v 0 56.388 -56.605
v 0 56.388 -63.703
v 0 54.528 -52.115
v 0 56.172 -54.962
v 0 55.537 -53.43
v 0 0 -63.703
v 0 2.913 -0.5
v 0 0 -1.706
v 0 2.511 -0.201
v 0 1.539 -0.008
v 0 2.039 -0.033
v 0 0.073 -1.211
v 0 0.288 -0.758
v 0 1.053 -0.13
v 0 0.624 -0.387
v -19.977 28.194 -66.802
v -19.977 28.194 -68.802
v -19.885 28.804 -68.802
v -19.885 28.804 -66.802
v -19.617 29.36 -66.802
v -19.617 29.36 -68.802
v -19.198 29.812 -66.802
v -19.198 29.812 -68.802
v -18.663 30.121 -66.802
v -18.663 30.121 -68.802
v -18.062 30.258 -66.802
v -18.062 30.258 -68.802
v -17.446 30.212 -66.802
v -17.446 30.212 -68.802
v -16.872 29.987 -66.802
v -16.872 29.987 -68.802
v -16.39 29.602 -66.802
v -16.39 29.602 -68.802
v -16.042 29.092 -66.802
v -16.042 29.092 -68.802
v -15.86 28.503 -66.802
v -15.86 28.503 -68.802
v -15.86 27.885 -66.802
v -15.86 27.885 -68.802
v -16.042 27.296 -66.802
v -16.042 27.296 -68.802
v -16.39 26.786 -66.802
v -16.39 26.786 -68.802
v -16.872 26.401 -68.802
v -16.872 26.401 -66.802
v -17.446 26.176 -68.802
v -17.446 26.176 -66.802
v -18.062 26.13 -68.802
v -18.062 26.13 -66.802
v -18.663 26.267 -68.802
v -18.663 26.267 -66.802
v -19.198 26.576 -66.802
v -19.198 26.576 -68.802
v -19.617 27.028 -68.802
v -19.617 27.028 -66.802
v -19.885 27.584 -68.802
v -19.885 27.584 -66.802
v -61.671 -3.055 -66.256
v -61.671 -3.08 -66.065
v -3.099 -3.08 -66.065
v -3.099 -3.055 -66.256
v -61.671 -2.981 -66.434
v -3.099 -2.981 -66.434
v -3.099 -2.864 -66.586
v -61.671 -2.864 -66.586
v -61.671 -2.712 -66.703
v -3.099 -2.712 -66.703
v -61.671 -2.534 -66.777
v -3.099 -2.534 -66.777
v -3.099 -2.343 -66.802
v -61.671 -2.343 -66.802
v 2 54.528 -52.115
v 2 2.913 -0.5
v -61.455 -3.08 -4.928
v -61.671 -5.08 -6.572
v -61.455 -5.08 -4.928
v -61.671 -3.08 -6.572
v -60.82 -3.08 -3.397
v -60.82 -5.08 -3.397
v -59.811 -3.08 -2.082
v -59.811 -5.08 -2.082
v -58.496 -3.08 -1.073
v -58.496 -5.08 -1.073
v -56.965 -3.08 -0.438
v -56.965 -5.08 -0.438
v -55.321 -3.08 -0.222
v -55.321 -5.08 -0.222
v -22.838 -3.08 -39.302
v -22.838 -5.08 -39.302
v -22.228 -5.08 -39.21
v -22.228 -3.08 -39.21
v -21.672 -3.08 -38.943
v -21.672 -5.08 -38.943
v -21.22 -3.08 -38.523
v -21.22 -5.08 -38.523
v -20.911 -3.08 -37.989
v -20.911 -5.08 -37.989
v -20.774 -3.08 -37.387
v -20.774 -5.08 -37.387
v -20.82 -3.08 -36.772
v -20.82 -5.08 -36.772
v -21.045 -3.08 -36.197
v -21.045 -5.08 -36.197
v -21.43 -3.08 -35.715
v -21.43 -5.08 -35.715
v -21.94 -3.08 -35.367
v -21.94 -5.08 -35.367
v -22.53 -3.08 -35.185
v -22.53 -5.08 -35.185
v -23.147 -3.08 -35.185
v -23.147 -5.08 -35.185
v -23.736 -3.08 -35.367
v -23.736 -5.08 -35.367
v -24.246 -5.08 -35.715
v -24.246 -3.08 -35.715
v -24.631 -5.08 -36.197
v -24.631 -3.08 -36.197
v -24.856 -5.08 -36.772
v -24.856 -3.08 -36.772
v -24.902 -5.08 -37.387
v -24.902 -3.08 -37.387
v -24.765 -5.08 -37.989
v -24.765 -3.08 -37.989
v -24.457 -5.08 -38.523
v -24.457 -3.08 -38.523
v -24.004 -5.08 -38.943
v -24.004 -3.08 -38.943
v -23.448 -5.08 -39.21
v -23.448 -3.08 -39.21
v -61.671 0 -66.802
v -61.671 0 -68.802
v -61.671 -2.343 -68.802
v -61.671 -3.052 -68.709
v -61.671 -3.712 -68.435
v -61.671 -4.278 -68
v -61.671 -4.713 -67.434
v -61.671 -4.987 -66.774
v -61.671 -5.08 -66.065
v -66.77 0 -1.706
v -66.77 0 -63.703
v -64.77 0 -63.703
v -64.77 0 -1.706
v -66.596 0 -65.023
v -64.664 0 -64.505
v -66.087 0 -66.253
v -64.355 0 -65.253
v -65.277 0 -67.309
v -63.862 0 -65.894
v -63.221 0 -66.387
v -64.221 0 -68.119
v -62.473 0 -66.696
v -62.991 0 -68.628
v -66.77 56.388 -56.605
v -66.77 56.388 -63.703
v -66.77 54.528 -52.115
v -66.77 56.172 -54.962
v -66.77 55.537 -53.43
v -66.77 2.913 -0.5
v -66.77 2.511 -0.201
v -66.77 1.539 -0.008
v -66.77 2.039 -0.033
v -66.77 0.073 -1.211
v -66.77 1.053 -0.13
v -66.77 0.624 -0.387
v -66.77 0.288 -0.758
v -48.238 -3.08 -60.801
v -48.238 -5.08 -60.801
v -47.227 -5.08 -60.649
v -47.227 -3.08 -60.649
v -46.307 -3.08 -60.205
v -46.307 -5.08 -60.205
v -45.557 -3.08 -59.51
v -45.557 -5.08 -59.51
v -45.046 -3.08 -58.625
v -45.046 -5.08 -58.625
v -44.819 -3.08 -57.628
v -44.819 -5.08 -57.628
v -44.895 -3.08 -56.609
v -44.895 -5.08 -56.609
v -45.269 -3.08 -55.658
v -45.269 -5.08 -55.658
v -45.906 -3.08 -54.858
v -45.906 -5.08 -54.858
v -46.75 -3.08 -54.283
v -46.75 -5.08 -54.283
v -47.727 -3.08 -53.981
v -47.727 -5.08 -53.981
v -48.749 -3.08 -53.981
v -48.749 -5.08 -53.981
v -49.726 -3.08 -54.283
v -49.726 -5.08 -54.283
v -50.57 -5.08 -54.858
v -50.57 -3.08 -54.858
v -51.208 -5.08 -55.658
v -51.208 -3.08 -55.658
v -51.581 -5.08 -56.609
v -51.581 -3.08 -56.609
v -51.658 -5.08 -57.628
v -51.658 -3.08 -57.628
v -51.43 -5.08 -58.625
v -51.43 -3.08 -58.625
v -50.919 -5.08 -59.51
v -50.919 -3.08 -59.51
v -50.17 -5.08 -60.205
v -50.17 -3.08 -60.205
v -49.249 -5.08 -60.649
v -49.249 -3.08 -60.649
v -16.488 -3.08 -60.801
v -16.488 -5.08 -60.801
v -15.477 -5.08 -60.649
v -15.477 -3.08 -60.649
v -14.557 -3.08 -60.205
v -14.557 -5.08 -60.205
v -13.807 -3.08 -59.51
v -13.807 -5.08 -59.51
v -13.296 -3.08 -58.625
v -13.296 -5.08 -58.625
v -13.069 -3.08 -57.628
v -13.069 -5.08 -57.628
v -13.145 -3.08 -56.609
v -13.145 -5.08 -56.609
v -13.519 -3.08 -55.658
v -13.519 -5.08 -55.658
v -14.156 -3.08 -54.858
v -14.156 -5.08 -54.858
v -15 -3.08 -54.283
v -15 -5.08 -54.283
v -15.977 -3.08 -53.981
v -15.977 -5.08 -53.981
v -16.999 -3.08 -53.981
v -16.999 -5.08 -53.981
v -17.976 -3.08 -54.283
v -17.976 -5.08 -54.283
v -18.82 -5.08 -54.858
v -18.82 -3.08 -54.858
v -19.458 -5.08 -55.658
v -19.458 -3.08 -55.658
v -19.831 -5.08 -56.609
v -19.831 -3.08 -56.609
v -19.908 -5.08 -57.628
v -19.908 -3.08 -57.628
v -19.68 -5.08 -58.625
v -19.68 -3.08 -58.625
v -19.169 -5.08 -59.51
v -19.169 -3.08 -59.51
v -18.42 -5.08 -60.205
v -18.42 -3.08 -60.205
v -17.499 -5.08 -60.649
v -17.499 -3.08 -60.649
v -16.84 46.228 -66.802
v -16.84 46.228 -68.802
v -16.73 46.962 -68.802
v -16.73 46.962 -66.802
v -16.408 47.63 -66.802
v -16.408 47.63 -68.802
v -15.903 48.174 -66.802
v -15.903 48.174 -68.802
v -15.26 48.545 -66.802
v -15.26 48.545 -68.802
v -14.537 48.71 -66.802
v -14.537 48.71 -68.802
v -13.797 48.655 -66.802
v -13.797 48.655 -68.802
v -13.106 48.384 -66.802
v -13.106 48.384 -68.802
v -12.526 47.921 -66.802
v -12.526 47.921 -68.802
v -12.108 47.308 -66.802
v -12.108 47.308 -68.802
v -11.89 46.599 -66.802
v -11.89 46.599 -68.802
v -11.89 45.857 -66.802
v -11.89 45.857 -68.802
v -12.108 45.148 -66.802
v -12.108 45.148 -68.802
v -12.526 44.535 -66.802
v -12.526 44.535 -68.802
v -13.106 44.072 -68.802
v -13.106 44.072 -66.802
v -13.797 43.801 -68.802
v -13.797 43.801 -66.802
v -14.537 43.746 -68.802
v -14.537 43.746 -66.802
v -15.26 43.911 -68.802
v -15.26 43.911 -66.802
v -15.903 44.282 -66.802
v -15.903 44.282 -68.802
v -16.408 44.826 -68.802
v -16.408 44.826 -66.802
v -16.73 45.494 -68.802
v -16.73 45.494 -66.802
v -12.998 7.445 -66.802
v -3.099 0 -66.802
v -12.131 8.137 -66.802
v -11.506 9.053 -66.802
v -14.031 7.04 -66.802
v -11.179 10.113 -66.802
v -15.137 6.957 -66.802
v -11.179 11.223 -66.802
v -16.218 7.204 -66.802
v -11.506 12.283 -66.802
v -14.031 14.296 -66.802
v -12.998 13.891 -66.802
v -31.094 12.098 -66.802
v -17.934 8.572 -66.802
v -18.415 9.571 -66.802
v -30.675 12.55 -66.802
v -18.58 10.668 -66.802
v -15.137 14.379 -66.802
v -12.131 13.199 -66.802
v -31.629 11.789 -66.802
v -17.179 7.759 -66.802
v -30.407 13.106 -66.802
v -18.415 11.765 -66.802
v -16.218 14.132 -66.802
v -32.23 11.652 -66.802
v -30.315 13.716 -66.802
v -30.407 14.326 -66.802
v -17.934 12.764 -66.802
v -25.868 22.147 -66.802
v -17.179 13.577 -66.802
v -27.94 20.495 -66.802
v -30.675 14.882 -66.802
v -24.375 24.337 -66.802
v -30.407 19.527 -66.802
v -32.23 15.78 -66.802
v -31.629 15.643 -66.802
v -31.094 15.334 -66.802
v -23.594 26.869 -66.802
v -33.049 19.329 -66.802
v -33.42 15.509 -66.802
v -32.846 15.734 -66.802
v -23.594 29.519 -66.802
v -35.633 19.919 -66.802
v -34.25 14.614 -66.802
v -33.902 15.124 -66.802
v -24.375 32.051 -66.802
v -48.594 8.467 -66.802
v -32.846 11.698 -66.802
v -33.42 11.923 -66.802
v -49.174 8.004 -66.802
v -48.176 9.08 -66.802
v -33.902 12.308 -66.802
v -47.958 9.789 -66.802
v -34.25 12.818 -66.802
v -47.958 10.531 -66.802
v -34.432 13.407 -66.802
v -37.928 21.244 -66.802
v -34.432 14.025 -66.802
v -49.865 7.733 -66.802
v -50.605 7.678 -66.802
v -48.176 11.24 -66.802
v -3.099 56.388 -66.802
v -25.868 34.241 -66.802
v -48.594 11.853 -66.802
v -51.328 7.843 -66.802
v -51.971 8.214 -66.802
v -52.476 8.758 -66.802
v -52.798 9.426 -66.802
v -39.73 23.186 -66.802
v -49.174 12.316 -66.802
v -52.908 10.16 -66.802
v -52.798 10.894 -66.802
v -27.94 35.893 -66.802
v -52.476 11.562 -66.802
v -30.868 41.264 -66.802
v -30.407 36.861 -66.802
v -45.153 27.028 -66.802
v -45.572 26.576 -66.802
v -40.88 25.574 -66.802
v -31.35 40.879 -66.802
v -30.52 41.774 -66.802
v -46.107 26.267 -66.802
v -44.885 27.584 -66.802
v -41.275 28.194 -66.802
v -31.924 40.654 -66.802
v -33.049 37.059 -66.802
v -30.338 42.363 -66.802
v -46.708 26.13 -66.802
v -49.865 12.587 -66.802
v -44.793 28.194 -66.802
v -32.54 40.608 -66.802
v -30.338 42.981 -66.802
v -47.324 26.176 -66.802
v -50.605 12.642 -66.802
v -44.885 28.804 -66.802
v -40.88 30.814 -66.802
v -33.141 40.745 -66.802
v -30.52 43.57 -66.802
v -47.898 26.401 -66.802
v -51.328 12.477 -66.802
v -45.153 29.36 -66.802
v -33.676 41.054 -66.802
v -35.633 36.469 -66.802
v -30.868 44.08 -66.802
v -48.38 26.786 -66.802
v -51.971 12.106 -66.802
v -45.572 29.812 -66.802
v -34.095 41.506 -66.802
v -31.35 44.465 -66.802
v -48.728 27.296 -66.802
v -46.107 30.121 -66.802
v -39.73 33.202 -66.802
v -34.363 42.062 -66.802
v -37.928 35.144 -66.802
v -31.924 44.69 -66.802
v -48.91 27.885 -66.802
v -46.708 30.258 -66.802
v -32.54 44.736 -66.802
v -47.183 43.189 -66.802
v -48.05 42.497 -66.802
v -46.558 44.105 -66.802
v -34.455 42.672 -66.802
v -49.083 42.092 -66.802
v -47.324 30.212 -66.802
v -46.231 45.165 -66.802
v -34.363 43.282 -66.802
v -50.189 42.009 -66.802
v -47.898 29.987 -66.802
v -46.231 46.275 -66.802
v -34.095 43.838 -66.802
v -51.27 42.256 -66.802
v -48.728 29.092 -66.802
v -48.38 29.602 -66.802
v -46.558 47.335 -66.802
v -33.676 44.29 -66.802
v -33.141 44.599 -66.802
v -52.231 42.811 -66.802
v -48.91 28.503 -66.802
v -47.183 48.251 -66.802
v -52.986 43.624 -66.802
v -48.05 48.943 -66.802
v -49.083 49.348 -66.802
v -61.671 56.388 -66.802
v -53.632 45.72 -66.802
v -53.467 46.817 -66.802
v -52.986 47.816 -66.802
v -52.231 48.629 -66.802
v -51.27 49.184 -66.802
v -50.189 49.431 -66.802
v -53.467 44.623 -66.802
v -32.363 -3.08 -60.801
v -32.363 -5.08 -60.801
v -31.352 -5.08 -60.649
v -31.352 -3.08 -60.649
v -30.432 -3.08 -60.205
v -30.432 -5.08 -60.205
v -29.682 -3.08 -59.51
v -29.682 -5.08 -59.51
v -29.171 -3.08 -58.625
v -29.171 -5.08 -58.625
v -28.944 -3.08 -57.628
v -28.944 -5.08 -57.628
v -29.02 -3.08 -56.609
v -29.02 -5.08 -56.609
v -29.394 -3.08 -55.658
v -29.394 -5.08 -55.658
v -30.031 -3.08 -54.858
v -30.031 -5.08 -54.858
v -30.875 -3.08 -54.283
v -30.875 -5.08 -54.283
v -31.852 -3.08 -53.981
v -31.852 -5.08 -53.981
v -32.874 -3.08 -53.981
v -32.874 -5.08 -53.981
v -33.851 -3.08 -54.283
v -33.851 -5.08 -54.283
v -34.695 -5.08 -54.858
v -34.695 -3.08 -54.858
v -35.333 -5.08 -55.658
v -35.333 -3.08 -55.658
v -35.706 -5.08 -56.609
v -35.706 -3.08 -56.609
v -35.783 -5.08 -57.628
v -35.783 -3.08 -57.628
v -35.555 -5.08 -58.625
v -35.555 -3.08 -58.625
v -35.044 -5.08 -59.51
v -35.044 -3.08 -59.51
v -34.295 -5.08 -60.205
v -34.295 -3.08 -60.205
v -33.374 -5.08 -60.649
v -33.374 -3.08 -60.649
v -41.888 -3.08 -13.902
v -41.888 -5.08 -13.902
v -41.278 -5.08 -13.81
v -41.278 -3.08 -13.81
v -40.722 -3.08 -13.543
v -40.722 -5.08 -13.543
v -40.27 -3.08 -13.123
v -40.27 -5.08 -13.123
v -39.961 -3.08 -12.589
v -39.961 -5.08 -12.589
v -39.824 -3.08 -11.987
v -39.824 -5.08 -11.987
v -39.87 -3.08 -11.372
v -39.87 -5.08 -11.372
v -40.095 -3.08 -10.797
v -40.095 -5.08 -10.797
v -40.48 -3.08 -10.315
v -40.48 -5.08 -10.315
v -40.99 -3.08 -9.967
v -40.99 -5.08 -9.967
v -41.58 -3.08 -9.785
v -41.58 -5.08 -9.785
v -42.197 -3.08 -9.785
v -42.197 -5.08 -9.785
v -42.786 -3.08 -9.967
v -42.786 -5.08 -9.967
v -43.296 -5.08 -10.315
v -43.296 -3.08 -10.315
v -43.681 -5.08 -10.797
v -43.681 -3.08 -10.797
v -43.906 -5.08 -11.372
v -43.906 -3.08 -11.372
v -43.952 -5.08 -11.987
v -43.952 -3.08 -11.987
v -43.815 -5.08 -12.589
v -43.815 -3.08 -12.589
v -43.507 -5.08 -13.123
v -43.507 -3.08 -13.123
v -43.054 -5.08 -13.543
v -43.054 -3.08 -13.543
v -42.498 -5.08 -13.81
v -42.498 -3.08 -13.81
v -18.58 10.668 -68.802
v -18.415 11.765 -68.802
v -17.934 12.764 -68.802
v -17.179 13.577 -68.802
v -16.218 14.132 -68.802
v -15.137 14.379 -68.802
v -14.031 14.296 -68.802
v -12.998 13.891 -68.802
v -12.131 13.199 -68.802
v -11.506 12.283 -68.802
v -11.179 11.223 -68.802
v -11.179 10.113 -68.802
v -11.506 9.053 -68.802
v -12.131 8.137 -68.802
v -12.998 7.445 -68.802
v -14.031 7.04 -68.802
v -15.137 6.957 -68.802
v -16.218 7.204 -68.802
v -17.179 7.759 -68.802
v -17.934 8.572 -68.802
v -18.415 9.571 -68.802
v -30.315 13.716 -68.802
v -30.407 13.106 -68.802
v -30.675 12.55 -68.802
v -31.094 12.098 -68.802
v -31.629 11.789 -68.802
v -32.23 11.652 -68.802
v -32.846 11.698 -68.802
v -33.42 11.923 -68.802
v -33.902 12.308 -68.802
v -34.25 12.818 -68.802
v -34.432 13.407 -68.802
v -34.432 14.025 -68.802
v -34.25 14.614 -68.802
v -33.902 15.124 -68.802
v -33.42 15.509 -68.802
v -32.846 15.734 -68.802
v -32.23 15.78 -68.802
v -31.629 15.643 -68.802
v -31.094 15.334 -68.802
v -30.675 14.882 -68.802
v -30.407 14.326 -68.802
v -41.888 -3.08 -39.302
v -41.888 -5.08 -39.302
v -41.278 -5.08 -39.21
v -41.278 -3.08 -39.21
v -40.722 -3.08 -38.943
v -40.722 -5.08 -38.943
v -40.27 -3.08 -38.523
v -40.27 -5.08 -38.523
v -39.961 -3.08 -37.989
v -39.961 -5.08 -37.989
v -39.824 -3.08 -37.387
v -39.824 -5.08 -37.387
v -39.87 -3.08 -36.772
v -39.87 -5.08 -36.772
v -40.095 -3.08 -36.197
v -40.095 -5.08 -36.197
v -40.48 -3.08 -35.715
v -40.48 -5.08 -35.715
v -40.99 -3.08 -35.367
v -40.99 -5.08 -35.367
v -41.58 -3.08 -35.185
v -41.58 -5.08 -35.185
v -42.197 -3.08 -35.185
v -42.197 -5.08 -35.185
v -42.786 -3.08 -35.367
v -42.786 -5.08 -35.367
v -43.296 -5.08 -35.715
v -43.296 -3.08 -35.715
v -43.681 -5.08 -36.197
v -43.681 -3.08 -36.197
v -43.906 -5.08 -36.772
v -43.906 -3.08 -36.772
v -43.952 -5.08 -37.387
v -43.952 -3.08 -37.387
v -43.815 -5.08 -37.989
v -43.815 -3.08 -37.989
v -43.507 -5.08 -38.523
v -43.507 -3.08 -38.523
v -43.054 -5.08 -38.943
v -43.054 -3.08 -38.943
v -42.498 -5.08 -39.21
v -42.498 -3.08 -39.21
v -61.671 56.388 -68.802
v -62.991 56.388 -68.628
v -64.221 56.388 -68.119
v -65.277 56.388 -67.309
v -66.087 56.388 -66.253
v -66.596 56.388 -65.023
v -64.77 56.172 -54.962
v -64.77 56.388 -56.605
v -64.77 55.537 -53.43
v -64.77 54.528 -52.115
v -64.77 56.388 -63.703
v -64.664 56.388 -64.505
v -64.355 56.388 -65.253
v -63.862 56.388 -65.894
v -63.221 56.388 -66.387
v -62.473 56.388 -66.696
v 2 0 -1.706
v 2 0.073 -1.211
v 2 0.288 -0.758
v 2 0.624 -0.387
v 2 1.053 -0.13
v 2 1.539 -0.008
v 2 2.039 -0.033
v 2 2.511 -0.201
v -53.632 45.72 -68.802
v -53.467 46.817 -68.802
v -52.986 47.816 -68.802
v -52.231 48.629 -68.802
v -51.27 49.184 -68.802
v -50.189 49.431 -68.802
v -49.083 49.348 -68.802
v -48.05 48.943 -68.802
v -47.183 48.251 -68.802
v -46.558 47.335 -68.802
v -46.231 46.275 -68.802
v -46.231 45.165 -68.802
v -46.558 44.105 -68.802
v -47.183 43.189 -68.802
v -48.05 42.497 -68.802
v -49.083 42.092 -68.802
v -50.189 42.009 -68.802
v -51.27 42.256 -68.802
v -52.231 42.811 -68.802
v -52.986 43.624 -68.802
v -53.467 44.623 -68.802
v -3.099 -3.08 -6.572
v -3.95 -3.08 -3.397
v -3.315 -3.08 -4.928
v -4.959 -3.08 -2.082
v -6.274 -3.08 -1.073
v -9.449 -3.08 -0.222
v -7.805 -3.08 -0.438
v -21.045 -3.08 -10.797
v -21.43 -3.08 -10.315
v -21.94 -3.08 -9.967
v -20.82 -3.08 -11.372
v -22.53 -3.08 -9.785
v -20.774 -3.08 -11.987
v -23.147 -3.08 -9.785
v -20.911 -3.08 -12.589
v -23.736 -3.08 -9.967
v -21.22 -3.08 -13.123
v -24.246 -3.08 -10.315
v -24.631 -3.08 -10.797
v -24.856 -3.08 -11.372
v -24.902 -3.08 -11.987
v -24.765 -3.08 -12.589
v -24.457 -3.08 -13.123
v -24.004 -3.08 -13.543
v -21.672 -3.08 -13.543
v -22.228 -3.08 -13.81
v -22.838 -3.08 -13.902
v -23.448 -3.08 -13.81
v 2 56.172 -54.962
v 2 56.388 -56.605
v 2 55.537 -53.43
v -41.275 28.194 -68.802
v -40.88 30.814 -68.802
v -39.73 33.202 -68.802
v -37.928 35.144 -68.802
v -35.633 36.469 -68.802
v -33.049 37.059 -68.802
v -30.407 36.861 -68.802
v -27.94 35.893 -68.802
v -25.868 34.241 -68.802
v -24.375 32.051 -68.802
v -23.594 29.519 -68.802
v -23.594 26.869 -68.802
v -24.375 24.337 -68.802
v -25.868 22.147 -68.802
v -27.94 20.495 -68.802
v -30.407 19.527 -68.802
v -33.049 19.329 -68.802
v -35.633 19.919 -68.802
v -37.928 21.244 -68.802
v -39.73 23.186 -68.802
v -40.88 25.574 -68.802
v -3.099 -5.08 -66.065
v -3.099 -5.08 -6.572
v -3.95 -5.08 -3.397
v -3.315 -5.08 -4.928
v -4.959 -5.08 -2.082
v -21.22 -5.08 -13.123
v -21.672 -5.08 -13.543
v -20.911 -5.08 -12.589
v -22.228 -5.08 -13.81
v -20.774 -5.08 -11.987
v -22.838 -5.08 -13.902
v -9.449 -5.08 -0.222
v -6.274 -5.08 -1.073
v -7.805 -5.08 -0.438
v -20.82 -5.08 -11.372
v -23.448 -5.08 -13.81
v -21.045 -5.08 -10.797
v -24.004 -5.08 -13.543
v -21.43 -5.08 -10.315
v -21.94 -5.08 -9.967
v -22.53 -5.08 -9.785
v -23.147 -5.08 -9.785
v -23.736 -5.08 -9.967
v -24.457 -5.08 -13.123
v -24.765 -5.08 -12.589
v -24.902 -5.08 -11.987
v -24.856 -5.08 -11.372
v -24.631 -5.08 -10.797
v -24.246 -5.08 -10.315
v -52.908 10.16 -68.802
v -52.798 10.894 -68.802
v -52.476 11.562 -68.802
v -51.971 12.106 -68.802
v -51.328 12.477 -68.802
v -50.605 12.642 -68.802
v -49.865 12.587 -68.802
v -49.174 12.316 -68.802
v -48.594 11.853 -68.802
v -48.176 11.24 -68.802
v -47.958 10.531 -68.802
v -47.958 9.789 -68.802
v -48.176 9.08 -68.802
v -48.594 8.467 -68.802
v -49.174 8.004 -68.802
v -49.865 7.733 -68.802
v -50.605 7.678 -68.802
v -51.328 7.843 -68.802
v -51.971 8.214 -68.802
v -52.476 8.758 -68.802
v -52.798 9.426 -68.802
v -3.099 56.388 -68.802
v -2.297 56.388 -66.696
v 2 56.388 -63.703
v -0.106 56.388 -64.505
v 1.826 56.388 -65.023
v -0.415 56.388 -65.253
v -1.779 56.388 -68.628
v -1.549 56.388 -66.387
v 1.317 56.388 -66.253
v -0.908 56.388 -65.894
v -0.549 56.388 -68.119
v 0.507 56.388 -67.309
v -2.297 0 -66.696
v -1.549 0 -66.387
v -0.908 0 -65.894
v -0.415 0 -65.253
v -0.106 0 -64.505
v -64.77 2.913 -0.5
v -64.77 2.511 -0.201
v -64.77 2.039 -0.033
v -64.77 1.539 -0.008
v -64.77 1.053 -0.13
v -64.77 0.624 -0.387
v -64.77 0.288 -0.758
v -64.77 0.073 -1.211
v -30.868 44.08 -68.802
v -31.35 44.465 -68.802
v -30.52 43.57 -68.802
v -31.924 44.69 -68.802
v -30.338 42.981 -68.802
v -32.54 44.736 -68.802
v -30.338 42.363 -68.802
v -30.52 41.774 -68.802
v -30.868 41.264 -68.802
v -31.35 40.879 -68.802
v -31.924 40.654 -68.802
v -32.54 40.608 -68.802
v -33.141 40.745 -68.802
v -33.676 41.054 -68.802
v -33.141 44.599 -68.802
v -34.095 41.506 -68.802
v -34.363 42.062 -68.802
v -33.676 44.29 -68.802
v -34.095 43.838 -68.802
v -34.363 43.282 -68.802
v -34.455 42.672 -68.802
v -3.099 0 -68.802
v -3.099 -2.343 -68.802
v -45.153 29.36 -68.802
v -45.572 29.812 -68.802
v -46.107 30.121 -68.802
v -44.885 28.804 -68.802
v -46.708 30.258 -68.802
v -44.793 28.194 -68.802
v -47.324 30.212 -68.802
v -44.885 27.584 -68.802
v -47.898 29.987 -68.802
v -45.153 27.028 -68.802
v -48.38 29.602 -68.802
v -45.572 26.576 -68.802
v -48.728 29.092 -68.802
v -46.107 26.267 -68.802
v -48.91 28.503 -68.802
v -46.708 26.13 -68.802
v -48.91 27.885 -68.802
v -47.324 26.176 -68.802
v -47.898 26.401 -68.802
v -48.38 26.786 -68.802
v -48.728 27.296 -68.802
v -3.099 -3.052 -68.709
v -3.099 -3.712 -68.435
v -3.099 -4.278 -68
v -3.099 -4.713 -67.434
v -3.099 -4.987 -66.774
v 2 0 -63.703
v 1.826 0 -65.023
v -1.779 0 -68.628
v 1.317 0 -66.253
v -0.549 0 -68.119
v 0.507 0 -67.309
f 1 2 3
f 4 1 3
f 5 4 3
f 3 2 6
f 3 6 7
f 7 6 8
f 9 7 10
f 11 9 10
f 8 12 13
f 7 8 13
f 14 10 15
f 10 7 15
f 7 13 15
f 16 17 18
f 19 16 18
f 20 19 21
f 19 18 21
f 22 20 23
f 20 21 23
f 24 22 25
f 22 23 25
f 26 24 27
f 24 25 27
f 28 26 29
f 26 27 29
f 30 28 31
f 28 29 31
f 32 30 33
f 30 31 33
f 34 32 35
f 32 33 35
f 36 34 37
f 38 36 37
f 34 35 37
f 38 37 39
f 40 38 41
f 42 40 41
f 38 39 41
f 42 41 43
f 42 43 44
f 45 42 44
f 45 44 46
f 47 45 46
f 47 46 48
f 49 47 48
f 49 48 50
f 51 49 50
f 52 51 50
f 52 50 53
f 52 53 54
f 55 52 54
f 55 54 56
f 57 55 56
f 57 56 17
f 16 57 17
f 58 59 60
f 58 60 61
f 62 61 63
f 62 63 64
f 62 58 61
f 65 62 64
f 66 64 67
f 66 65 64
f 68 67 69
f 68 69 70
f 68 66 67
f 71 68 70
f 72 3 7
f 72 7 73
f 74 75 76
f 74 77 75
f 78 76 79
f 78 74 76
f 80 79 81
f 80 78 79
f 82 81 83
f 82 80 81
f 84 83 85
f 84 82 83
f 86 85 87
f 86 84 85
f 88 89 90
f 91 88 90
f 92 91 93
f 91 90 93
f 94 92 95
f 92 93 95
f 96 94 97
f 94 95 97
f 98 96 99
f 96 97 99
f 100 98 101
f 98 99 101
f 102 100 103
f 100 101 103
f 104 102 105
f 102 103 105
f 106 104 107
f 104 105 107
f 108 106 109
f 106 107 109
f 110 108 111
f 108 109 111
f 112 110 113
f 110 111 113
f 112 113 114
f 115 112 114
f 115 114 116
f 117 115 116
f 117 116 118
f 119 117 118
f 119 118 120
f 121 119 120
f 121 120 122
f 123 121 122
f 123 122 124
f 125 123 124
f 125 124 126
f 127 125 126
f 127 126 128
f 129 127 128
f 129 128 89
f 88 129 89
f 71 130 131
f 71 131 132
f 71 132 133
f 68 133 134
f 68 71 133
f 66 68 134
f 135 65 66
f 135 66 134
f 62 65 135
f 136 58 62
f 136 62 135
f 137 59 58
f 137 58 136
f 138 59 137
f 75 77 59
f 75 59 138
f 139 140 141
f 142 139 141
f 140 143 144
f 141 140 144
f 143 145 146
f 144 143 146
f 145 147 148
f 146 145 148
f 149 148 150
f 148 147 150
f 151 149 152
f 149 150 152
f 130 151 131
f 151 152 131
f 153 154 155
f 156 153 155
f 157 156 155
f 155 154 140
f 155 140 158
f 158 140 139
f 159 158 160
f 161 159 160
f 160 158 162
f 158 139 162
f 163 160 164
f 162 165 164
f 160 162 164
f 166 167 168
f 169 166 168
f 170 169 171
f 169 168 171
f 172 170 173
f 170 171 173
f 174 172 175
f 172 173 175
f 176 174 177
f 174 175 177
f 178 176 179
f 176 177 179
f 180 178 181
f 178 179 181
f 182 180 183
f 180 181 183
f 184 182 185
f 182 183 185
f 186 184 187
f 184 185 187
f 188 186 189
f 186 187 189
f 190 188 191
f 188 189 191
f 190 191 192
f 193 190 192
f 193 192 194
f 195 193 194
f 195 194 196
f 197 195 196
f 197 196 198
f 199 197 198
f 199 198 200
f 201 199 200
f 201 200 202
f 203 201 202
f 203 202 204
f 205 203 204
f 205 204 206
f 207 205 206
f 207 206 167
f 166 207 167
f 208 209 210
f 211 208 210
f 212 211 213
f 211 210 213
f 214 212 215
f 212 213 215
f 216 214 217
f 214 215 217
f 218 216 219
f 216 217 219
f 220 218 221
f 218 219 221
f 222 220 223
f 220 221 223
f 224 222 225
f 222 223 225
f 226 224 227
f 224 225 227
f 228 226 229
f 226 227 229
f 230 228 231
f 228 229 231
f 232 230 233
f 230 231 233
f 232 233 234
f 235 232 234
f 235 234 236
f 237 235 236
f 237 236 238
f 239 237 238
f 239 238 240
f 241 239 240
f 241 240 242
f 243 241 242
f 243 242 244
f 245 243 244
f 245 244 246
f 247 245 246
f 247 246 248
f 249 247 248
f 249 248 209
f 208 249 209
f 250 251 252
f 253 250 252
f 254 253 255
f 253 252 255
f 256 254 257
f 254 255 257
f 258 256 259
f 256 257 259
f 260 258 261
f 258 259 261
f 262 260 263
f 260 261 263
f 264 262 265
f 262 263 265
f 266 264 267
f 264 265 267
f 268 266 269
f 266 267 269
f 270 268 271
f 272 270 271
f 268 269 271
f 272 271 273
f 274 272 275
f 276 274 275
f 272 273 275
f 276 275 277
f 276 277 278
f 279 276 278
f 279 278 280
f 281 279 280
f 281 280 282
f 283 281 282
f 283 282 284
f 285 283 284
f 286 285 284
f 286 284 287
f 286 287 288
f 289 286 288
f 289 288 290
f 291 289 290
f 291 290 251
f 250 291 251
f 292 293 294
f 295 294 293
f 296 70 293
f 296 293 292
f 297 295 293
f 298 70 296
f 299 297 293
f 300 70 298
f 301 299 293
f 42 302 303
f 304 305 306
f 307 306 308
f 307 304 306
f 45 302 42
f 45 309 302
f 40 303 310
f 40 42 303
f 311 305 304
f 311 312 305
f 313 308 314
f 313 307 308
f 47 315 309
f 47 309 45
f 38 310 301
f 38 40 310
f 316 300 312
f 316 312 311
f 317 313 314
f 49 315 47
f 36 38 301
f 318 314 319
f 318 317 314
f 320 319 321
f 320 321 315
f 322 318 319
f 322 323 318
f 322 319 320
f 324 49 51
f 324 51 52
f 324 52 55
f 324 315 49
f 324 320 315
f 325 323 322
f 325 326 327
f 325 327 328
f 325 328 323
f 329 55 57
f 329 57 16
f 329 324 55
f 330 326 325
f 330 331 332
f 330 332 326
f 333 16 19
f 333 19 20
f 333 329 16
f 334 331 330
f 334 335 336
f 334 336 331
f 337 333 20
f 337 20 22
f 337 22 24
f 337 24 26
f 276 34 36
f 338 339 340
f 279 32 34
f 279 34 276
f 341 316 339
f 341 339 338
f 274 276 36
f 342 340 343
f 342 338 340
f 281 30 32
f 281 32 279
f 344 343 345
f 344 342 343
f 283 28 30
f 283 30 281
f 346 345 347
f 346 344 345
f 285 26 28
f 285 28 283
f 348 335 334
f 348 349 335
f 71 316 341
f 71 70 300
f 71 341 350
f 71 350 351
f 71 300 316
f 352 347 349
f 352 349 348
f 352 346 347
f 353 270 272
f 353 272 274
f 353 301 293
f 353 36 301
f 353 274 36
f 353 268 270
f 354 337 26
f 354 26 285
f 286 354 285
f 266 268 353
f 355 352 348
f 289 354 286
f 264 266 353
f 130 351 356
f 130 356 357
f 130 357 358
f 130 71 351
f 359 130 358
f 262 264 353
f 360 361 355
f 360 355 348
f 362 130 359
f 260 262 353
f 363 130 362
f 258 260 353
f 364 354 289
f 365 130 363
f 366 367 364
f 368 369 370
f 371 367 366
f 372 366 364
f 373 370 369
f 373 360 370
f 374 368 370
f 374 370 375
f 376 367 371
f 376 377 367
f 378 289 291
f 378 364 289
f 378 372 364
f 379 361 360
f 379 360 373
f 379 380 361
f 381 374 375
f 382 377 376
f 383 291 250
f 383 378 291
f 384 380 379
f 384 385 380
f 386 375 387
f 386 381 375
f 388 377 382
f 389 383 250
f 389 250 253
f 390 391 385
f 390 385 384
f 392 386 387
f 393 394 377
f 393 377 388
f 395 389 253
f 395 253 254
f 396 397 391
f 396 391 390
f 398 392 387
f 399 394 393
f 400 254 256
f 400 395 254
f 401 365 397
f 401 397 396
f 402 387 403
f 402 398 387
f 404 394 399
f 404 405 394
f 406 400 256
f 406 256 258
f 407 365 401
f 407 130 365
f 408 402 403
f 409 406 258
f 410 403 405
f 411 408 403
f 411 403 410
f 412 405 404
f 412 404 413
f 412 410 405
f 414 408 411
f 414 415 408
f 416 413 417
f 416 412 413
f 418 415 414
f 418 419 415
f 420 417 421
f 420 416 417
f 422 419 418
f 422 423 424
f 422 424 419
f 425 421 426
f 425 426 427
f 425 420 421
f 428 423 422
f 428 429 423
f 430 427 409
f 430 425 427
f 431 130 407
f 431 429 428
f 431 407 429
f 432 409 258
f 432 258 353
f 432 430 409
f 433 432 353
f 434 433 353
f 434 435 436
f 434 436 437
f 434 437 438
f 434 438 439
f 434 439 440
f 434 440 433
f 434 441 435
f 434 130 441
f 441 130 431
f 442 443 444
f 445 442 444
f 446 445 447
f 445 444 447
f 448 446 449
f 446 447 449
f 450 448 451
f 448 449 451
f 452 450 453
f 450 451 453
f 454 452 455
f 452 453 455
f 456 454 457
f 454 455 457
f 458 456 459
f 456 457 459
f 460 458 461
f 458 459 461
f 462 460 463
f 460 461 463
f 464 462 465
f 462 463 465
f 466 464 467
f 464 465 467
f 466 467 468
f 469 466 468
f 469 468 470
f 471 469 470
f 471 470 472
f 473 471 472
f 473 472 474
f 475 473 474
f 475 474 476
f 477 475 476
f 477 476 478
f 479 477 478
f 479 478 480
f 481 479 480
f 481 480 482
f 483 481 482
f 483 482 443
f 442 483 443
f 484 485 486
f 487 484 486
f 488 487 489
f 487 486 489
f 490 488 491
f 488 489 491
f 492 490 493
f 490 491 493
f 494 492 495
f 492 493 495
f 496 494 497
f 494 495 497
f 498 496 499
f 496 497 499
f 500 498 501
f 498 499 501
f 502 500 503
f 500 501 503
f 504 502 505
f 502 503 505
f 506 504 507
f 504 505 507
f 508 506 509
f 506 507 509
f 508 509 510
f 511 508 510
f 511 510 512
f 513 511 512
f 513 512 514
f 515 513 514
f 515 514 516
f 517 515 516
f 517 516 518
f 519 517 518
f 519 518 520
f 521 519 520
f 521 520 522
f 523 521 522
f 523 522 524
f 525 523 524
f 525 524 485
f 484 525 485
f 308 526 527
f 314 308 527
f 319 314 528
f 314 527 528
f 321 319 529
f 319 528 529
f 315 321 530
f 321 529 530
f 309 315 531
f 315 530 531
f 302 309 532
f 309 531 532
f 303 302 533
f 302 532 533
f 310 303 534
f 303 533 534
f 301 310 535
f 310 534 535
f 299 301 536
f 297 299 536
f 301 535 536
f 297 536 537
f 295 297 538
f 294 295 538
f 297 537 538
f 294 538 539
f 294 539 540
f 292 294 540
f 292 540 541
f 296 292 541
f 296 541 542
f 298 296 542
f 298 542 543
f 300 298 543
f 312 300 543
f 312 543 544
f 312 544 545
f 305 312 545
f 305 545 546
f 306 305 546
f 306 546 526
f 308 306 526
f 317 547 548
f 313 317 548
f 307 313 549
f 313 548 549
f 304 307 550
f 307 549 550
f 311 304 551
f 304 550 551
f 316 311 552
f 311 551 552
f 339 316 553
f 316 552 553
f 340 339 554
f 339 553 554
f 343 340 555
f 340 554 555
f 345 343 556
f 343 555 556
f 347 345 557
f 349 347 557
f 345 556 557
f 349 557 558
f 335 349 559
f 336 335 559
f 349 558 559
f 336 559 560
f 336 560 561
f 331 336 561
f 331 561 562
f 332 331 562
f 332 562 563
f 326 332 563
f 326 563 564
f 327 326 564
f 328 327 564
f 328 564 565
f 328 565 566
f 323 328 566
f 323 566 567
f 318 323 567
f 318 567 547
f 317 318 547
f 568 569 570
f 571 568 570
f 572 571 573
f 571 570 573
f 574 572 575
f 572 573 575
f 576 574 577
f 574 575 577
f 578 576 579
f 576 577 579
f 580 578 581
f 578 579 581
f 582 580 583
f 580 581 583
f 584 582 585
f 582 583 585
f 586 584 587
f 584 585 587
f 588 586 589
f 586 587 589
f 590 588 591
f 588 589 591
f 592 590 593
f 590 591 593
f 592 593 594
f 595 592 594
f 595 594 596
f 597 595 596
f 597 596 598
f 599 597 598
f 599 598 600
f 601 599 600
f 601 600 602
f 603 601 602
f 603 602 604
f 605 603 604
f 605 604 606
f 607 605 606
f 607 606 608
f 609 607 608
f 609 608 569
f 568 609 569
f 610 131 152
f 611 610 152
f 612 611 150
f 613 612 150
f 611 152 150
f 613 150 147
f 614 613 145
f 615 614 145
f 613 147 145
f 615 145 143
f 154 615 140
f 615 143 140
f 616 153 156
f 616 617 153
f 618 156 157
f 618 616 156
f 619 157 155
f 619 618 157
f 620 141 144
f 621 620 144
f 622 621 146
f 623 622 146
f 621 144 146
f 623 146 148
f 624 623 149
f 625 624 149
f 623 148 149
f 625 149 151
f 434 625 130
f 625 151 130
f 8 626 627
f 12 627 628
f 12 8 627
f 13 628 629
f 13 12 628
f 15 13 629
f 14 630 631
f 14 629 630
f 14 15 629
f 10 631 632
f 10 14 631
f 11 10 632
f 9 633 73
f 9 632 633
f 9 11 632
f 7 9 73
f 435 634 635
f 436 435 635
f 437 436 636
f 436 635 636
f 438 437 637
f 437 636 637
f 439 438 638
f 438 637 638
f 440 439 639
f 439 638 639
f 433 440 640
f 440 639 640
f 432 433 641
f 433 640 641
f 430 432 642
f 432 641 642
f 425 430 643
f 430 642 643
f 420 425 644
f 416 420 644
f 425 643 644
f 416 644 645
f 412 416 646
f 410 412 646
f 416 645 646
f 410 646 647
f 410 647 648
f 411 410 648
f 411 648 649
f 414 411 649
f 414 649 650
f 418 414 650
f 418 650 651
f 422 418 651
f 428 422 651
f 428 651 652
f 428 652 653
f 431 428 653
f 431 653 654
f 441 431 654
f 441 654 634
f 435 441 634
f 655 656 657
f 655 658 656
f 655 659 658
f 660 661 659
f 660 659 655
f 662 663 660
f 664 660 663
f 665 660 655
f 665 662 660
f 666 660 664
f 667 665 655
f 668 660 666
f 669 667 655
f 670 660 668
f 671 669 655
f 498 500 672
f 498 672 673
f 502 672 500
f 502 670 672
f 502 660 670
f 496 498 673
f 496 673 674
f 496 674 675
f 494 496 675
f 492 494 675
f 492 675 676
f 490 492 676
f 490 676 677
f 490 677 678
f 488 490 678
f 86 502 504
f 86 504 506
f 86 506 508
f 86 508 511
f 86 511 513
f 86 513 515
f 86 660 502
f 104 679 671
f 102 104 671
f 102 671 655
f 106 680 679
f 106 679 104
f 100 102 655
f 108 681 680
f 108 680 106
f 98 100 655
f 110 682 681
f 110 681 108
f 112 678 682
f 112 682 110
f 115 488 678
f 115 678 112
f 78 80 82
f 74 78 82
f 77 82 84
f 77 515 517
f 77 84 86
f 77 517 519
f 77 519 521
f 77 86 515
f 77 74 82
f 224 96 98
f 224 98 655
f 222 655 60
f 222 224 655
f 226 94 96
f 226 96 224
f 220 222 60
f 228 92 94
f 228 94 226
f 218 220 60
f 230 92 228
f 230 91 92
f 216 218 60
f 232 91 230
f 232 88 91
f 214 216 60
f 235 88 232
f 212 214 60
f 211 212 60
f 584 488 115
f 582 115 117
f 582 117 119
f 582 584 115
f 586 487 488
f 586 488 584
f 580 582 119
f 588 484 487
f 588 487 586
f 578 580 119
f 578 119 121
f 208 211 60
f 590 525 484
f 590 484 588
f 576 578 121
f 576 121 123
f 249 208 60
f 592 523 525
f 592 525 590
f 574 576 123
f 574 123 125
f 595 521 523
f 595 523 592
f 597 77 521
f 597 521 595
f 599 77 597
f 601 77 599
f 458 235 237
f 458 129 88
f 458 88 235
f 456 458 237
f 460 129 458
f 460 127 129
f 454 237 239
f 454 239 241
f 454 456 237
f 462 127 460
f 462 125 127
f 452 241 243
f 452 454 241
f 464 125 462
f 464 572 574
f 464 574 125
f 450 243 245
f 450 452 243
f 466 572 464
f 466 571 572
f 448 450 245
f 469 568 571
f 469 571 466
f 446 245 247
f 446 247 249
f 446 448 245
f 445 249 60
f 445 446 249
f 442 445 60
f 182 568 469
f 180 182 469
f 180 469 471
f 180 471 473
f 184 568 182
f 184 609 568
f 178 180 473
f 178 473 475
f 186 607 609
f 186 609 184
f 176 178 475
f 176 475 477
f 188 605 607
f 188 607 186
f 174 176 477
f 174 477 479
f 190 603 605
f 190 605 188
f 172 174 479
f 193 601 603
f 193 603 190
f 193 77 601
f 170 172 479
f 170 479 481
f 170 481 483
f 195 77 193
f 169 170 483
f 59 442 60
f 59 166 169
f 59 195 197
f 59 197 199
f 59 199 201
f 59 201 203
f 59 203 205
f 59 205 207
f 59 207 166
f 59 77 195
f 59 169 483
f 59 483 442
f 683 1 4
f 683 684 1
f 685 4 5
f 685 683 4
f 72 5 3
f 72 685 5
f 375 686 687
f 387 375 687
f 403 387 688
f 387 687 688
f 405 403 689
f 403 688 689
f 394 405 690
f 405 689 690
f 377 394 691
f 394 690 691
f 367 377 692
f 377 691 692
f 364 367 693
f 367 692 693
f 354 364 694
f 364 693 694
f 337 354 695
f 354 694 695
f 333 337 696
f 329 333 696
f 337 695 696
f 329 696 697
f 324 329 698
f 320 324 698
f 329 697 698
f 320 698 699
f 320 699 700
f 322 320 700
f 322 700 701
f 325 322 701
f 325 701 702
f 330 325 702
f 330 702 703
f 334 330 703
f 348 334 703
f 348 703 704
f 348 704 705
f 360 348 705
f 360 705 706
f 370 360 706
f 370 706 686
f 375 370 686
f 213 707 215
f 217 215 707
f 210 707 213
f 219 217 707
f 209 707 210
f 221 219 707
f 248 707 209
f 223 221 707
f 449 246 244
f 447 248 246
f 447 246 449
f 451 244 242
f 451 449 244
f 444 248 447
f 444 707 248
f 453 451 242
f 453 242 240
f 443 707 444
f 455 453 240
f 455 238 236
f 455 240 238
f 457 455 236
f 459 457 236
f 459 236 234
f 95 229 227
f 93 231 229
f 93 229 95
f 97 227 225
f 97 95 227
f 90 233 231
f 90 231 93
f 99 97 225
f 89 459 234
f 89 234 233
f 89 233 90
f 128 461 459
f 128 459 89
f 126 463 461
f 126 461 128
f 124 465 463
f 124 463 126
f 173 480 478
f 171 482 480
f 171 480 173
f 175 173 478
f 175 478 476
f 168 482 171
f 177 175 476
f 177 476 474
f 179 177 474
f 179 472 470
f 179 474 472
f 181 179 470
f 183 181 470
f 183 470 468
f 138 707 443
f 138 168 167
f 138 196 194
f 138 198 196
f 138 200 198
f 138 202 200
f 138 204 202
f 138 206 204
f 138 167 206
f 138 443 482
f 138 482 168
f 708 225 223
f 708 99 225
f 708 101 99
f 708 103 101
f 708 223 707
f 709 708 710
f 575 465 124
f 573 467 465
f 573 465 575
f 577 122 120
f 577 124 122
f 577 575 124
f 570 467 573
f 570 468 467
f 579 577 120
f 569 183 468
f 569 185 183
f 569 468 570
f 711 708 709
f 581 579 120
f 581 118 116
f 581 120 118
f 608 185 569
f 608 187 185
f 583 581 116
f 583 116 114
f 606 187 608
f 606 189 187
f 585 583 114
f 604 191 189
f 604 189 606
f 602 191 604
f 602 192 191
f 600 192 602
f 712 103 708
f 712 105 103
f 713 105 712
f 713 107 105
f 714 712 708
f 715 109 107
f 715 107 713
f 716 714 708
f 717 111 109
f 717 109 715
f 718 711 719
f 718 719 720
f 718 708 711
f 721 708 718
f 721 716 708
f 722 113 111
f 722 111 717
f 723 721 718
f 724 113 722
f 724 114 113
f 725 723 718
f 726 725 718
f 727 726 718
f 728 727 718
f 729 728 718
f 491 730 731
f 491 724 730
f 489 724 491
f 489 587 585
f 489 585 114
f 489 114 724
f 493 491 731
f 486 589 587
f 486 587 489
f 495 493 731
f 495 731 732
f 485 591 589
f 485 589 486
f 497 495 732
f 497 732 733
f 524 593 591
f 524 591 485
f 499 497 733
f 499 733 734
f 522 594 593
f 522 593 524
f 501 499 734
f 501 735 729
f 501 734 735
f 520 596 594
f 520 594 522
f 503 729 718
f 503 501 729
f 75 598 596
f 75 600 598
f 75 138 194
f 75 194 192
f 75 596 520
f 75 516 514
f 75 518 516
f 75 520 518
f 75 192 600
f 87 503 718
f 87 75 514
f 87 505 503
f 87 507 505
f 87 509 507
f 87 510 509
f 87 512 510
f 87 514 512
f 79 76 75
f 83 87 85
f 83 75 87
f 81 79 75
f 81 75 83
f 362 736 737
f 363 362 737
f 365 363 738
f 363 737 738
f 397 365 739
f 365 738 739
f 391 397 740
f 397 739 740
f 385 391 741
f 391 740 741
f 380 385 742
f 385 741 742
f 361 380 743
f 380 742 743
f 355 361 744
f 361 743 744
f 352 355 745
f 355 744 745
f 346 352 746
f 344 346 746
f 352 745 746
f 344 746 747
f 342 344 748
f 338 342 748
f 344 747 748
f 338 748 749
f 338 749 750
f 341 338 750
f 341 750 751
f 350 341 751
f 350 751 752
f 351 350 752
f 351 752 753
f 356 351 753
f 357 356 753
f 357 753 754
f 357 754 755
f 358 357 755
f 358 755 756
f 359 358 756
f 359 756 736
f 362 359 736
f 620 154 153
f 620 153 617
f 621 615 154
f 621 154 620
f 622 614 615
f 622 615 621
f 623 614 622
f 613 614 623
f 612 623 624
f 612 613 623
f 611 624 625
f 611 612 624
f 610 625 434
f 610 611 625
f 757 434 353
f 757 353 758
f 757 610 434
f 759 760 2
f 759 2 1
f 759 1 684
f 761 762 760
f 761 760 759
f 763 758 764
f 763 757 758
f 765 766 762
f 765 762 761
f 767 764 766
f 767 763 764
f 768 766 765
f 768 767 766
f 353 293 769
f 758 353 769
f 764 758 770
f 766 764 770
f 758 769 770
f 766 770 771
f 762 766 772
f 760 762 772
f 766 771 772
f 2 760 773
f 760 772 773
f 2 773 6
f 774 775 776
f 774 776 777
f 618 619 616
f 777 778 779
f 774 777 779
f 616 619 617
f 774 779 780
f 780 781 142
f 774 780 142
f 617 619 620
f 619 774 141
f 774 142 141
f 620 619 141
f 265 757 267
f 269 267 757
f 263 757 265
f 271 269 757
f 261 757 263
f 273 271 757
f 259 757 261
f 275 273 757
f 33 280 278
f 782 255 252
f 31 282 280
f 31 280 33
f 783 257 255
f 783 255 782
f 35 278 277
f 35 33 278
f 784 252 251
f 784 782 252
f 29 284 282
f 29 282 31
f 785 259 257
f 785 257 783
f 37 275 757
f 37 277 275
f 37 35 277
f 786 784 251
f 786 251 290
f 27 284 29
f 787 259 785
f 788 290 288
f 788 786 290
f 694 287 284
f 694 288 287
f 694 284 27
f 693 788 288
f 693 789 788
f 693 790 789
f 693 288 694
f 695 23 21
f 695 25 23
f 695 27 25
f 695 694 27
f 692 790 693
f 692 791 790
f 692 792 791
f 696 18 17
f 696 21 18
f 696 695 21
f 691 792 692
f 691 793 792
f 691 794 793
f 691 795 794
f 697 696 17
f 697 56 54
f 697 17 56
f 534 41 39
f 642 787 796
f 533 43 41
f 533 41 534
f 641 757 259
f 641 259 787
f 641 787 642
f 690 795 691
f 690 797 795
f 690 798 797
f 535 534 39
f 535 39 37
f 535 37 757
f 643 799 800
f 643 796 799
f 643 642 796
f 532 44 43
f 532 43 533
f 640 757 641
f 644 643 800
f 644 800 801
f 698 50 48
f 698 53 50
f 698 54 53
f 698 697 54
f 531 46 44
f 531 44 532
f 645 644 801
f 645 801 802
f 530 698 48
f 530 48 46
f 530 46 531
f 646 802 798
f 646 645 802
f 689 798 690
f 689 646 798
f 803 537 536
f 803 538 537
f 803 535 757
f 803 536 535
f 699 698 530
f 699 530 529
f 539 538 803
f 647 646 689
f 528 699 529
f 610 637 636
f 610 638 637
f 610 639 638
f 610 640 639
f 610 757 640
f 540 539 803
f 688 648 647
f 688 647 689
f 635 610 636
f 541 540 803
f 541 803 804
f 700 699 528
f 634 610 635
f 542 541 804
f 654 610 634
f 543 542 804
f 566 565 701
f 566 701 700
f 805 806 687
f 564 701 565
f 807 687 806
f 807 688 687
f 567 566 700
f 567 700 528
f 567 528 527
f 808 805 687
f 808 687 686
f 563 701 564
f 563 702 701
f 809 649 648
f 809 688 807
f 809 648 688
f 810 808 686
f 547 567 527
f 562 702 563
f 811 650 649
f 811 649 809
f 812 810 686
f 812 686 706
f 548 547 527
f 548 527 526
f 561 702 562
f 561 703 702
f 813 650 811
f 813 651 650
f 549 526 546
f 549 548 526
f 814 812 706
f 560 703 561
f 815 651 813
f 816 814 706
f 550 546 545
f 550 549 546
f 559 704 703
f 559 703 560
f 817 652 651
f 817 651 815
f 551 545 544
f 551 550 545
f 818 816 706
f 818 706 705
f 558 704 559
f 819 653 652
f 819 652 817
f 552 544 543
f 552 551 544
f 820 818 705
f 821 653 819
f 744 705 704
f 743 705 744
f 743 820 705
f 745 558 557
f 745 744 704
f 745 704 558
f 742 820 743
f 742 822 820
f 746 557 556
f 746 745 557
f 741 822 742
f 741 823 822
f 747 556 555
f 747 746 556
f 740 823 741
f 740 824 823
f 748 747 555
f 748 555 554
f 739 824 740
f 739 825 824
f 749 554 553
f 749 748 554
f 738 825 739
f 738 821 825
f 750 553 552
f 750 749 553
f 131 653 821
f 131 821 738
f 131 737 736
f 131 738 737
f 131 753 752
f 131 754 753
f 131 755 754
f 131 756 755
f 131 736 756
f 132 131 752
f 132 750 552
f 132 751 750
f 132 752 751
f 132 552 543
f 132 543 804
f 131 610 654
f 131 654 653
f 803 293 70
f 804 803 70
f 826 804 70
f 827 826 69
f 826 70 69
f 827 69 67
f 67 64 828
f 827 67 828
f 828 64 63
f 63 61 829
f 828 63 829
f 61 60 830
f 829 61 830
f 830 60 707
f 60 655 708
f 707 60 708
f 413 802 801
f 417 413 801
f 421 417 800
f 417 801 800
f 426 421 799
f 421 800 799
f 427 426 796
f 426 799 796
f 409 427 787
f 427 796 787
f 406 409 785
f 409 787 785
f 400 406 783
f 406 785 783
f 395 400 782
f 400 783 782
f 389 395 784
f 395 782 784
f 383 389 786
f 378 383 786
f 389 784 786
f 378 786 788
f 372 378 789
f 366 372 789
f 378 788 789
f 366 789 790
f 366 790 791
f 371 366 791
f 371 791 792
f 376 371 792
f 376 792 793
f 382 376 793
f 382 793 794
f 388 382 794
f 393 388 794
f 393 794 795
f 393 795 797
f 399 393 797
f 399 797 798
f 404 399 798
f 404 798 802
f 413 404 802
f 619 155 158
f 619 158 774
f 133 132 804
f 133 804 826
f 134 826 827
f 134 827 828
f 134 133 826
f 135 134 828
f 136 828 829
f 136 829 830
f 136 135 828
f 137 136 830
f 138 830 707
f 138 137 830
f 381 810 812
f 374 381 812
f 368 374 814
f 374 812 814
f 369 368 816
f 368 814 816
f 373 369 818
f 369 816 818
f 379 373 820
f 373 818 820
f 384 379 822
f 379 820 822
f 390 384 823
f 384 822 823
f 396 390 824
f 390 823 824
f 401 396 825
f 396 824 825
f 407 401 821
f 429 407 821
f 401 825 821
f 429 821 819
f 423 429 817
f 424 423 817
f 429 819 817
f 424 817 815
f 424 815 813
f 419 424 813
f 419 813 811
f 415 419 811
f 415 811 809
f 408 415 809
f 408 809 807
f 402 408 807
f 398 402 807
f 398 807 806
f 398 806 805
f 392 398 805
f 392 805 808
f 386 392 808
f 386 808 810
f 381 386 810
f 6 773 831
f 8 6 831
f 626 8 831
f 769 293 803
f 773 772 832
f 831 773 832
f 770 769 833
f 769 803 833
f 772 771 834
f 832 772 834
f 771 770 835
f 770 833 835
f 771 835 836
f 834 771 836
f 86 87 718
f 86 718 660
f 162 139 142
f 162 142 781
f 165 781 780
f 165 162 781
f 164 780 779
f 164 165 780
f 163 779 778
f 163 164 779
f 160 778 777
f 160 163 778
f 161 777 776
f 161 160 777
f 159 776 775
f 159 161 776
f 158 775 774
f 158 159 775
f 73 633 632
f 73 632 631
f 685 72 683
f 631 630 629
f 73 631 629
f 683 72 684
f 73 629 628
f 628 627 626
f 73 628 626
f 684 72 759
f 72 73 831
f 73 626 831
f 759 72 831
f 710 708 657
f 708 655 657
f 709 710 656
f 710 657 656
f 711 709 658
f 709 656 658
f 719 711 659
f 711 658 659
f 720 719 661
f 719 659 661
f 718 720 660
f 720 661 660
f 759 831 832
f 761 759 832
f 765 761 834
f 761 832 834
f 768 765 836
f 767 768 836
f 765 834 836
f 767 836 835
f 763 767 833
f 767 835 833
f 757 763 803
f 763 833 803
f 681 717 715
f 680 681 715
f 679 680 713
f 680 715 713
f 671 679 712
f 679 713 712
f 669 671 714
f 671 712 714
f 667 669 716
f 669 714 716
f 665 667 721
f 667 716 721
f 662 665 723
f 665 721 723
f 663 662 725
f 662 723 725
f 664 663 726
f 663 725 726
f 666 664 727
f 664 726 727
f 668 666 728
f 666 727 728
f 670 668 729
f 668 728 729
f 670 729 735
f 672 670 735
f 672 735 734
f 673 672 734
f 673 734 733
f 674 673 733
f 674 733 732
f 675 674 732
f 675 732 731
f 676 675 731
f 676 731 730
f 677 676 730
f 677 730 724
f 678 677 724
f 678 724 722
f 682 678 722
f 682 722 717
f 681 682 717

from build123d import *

# Parameters (mm, degrees)
BASE_FLANGE1_DEPTH      = 56.388
EDGE_FLANGE2_DEPTH      = 58.5724
BREAK_CORNER3_START     = 1.706248663
BREAK_CORNER3_OUTLINE_W = 2
BREAK_CORNER3_OUTLINE_H = 81
BREAK_CORNER3_DEPTH     = 38.166088515
BREAK_CORNER4_START     = 1.706248663
BREAK_CORNER4_OUTLINE_W = 2
BREAK_CORNER4_OUTLINE_H = 81
BREAK_CORNER4_DEPTH     = 38.166088515
SKETCH21_R              = 8.89
SKETCH21_R_2            = 3.7211
SKETCH21_R_3            = 2.4892
SKETCH21_R_4            = 2.0701
CUT_EXTRUDE1_DEPTH      = 112.227490523
SKETCH22_R              = 3.429
CUT_EXTRUDE2_DEPTH      = 114.887063041
SKETCH23_R              = 2.0701
CUT_EXTRUDE3_DEPTH      = 114.887063041
FILLET1_R               = 6.35
CUT_EXTRUDE4_DEPTH      = 73.406


# Read off the part's stored shape, not the designer's step: Base-Flange1, Break-Corner3, Break-Corner4
# Sheet-metal steps are written as plain solids
with BuildPart() as part:
    # Base-Flange1 outline → Base-Flange1 (new body)
    with BuildSketch(Plane(origin=(0, 0, 0), x_dir=(1, 0, 0), z_dir=(0, 1, 0))):
        with BuildLine():
            Line((-66.77, 63.7032), (-66.77, 0))
            Line((-66.77, 0), (-64.77, 0))
            Line((-64.77, 0), (-64.77, 63.7032))
            ThreePointArc((-64.77, 63.7032), (-63.862382494, 65.894382494), (-61.6712, 66.802))
            Line((-61.6712, 66.802), (-3.0988, 66.802))
            ThreePointArc((-3.0988, 66.802), (-0.907617506, 65.894382494), (0, 63.7032))
            Line((0, 63.7032), (0, 0))
            Line((0, 0), (2, 0))
            Line((2, 0), (2, 63.7032))
            ThreePointArc((2, 63.7032), (0.506596056, 67.308596056), (-3.0988, 68.802))
            Line((-3.0988, 68.802), (-61.6712, 68.802))
            ThreePointArc((-61.6712, 68.802), (-65.276596056, 67.308596056), (-66.77, 63.7032))
        make_face()
    extrude(amount=BASE_FLANGE1_DEPTH)

    # Edge-Flange2 section (across the edge) → Edge-Flange2 (add)
    with BuildSketch(Plane(origin=(-61.6712, -5.08, -66.802), x_dir=(0, 1, 0), z_dir=(1, 0, 0))):
        with BuildLine():
            Line((0, 0.7366), (0, 66.58))
            Line((0, 66.58), (2, 66.58))
            Line((2, 66.58), (2, 0.7366))
            ThreePointArc((2, 0.7366), (2.215745145, 0.215745145), (2.7366, 0))
            Line((2.7366, 0), (5.08, 0))
            Line((5.08, 0), (5.08, -2))
            Line((5.08, -2), (2.7366, -2))
            ThreePointArc((2.7366, -2), (0.801531583, -1.198468417), (0, 0.7366))
        make_face()
    extrude(amount=EDGE_FLANGE2_DEPTH)

    # Break-Corner3 outline → Break-Corner3 (cut)
    with BuildSketch(Plane(origin=(0, 0, 0), x_dir=(1, 0, 0), z_dir=(0, 0.7071067811865476, 0.7071067811865476)).offset(BREAK_CORNER3_START)):
        with Locations((-65.77, 39.5)):
            Rectangle(BREAK_CORNER3_OUTLINE_W, BREAK_CORNER3_OUTLINE_H)
    extrude(amount=BREAK_CORNER3_DEPTH, mode=Mode.SUBTRACT)

    # Break-Corner4 outline → Break-Corner4 (cut)
    with BuildSketch(Plane(origin=(0, 0, 0), x_dir=(1, 0, 0), z_dir=(0, 0.7071067811865476, 0.7071067811865476)).offset(BREAK_CORNER4_START)):
        with Locations((1, 39.5)):
            Rectangle(BREAK_CORNER4_OUTLINE_W, BREAK_CORNER4_OUTLINE_H)
    extrude(amount=BREAK_CORNER4_DEPTH, mode=Mode.SUBTRACT)

    # Sketch21 → Cut-Extrude1 (cut, through all)
    with BuildSketch(Plane(origin=(0, 0, -68.802), x_dir=(-1, 0, 0), z_dir=(0, 0, -1))):
        with Locations((32.385, 28.194)):
            Circle(SKETCH21_R)
        with Locations((49.911, 45.72)):
            Circle(SKETCH21_R_2)
        with Locations((14.859, 10.668)):
            Circle(SKETCH21_R_2)
        with Locations((14.351, 46.228)):
            Circle(SKETCH21_R_3)
        with Locations((50.419, 10.16)):
            Circle(SKETCH21_R_3)
        with Locations((32.385, 42.672)):
            Circle(SKETCH21_R_4)
        with Locations((17.907, 28.194)):
            Circle(SKETCH21_R_4)
        with Locations(Location((32.385, 13.716, 0), (0, 0, 180))):
            Circle(SKETCH21_R_4)
        with Locations(Location((46.863, 28.194, 0), (0, 0, 180))):
            Circle(SKETCH21_R_4)
    extrude(amount=-CUT_EXTRUDE1_DEPTH, mode=Mode.SUBTRACT)

    # Sketch22 → Cut-Extrude2 (cut, through all)
    with BuildSketch(Plane.XZ.offset(5.08)):
        with Locations(Location((-48.238156, -57.372, 0), (0, 0, 270))):
            Circle(SKETCH22_R)
        with Locations(Location((-16.488156, -57.372, 0), (0, 0, 270))):
            Circle(SKETCH22_R)
        with Locations(Location((-32.363156, -57.372, 0), (0, 0, 270))):
            Circle(SKETCH22_R)
    extrude(amount=-CUT_EXTRUDE2_DEPTH, mode=Mode.SUBTRACT)

    # Sketch23 → Cut-Extrude3 (cut, through all)
    with BuildSketch(Plane.XZ.offset(5.08)):
        with Locations(Location((-41.888156, -37.23234, 0), (0, 0, 270))):
            Circle(SKETCH23_R)
        with Locations(Location((-41.888156, -11.83234, 0), (0, 0, 270))):
            Circle(SKETCH23_R)
        with Locations(Location((-22.838156, -37.23234, 0), (0, 0, 270))):
            Circle(SKETCH23_R)
        with Locations(Location((-22.838156, -11.83234, 0), (0, 0, 270))):
            Circle(SKETCH23_R)
    extrude(amount=-CUT_EXTRUDE3_DEPTH, mode=Mode.SUBTRACT)

    # Fillet1
    fillet1_edges = [part.edges().sort_by_distance(p)[0] for p in [
        (-61.6712, -4.08, -0.222),
        (-3.0988, -4.08, -0.222),
        (-65.77, 56.388, -53.975),
        (1, 56.388, -53.975),
    ]]
    fillet(fillet1_edges, radius=FILLET1_R)

    # Sketch24 → Cut-Extrude4 (cut)
    with BuildSketch(Plane.ZY.offset(66.77)):
        with BuildLine():
            Line((-0.499748663, 2.912748663), (0, 2.413))
            Line((0, 2.413), (1.847190311, 1.053295568))
            Line((1.847190311, 1.053295568), (0, 0))
            Line((0, 0), (-1.706248663, 0))
            ThreePointArc((-1.706248663, 0), (-0.129880446, 1.053295568), (-0.499748663, 2.912748663))
        make_face()
    extrude(amount=-CUT_EXTRUDE4_DEPTH, mode=Mode.SUBTRACT)


solid = part.part
